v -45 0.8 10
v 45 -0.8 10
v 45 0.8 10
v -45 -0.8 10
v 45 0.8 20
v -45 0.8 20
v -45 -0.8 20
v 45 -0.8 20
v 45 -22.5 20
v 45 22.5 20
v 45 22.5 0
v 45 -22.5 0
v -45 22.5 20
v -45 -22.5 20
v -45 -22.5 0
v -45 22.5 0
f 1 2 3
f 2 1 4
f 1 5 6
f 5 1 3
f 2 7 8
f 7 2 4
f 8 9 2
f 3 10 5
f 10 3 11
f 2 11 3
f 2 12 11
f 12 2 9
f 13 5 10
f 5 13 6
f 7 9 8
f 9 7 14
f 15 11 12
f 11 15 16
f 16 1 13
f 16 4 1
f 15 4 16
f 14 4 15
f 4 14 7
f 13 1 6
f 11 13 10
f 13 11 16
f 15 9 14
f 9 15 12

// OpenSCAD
// Slide drying rack - holds 10 microscope slides standing upright on their long edge
// Print orientation: base block on the bed (z = 0), slots open upward (+Z)

// ---------------- Parameters ----------------
block_len    = 90;    // base block length along X (mm)
block_wid    = 45;    // base block width along Y (mm)
block_ht     = 20;    // base block height along Z (mm)

slot_count   = 10;    // number of slide slots
slot_len     = 77;    // slot length along X (mm)
slot_wid     = 1.6;   // slot width along Y (mm)
slot_depth   = 10;    // slot depth into block from top face (mm)
slot_pitch   = 3.5;   // centre-to-centre slot spacing along Y (mm)

eps          = 0.5;   // overshoot of cutters past the top face (mm)

$fn = 64;

// ---------------- Model ----------------
difference() {
    // Base block, centred in X and Y, sitting on z = 0
    translate([-block_len / 2, -block_wid / 2, 0])
        cube([block_len, block_wid, block_ht]);

    // Parallel slots, centred as a group in X and Y
    for (i = [0 : slot_count - 1]) {
        x = (i - (slot_count - 1) / 2) * slot_pitch;
        translate([x - slot_len / 2, -slot_wid / 2, block_ht - slot_depth])
            cube([slot_len, slot_wid, slot_depth + eps]);
    }
}
